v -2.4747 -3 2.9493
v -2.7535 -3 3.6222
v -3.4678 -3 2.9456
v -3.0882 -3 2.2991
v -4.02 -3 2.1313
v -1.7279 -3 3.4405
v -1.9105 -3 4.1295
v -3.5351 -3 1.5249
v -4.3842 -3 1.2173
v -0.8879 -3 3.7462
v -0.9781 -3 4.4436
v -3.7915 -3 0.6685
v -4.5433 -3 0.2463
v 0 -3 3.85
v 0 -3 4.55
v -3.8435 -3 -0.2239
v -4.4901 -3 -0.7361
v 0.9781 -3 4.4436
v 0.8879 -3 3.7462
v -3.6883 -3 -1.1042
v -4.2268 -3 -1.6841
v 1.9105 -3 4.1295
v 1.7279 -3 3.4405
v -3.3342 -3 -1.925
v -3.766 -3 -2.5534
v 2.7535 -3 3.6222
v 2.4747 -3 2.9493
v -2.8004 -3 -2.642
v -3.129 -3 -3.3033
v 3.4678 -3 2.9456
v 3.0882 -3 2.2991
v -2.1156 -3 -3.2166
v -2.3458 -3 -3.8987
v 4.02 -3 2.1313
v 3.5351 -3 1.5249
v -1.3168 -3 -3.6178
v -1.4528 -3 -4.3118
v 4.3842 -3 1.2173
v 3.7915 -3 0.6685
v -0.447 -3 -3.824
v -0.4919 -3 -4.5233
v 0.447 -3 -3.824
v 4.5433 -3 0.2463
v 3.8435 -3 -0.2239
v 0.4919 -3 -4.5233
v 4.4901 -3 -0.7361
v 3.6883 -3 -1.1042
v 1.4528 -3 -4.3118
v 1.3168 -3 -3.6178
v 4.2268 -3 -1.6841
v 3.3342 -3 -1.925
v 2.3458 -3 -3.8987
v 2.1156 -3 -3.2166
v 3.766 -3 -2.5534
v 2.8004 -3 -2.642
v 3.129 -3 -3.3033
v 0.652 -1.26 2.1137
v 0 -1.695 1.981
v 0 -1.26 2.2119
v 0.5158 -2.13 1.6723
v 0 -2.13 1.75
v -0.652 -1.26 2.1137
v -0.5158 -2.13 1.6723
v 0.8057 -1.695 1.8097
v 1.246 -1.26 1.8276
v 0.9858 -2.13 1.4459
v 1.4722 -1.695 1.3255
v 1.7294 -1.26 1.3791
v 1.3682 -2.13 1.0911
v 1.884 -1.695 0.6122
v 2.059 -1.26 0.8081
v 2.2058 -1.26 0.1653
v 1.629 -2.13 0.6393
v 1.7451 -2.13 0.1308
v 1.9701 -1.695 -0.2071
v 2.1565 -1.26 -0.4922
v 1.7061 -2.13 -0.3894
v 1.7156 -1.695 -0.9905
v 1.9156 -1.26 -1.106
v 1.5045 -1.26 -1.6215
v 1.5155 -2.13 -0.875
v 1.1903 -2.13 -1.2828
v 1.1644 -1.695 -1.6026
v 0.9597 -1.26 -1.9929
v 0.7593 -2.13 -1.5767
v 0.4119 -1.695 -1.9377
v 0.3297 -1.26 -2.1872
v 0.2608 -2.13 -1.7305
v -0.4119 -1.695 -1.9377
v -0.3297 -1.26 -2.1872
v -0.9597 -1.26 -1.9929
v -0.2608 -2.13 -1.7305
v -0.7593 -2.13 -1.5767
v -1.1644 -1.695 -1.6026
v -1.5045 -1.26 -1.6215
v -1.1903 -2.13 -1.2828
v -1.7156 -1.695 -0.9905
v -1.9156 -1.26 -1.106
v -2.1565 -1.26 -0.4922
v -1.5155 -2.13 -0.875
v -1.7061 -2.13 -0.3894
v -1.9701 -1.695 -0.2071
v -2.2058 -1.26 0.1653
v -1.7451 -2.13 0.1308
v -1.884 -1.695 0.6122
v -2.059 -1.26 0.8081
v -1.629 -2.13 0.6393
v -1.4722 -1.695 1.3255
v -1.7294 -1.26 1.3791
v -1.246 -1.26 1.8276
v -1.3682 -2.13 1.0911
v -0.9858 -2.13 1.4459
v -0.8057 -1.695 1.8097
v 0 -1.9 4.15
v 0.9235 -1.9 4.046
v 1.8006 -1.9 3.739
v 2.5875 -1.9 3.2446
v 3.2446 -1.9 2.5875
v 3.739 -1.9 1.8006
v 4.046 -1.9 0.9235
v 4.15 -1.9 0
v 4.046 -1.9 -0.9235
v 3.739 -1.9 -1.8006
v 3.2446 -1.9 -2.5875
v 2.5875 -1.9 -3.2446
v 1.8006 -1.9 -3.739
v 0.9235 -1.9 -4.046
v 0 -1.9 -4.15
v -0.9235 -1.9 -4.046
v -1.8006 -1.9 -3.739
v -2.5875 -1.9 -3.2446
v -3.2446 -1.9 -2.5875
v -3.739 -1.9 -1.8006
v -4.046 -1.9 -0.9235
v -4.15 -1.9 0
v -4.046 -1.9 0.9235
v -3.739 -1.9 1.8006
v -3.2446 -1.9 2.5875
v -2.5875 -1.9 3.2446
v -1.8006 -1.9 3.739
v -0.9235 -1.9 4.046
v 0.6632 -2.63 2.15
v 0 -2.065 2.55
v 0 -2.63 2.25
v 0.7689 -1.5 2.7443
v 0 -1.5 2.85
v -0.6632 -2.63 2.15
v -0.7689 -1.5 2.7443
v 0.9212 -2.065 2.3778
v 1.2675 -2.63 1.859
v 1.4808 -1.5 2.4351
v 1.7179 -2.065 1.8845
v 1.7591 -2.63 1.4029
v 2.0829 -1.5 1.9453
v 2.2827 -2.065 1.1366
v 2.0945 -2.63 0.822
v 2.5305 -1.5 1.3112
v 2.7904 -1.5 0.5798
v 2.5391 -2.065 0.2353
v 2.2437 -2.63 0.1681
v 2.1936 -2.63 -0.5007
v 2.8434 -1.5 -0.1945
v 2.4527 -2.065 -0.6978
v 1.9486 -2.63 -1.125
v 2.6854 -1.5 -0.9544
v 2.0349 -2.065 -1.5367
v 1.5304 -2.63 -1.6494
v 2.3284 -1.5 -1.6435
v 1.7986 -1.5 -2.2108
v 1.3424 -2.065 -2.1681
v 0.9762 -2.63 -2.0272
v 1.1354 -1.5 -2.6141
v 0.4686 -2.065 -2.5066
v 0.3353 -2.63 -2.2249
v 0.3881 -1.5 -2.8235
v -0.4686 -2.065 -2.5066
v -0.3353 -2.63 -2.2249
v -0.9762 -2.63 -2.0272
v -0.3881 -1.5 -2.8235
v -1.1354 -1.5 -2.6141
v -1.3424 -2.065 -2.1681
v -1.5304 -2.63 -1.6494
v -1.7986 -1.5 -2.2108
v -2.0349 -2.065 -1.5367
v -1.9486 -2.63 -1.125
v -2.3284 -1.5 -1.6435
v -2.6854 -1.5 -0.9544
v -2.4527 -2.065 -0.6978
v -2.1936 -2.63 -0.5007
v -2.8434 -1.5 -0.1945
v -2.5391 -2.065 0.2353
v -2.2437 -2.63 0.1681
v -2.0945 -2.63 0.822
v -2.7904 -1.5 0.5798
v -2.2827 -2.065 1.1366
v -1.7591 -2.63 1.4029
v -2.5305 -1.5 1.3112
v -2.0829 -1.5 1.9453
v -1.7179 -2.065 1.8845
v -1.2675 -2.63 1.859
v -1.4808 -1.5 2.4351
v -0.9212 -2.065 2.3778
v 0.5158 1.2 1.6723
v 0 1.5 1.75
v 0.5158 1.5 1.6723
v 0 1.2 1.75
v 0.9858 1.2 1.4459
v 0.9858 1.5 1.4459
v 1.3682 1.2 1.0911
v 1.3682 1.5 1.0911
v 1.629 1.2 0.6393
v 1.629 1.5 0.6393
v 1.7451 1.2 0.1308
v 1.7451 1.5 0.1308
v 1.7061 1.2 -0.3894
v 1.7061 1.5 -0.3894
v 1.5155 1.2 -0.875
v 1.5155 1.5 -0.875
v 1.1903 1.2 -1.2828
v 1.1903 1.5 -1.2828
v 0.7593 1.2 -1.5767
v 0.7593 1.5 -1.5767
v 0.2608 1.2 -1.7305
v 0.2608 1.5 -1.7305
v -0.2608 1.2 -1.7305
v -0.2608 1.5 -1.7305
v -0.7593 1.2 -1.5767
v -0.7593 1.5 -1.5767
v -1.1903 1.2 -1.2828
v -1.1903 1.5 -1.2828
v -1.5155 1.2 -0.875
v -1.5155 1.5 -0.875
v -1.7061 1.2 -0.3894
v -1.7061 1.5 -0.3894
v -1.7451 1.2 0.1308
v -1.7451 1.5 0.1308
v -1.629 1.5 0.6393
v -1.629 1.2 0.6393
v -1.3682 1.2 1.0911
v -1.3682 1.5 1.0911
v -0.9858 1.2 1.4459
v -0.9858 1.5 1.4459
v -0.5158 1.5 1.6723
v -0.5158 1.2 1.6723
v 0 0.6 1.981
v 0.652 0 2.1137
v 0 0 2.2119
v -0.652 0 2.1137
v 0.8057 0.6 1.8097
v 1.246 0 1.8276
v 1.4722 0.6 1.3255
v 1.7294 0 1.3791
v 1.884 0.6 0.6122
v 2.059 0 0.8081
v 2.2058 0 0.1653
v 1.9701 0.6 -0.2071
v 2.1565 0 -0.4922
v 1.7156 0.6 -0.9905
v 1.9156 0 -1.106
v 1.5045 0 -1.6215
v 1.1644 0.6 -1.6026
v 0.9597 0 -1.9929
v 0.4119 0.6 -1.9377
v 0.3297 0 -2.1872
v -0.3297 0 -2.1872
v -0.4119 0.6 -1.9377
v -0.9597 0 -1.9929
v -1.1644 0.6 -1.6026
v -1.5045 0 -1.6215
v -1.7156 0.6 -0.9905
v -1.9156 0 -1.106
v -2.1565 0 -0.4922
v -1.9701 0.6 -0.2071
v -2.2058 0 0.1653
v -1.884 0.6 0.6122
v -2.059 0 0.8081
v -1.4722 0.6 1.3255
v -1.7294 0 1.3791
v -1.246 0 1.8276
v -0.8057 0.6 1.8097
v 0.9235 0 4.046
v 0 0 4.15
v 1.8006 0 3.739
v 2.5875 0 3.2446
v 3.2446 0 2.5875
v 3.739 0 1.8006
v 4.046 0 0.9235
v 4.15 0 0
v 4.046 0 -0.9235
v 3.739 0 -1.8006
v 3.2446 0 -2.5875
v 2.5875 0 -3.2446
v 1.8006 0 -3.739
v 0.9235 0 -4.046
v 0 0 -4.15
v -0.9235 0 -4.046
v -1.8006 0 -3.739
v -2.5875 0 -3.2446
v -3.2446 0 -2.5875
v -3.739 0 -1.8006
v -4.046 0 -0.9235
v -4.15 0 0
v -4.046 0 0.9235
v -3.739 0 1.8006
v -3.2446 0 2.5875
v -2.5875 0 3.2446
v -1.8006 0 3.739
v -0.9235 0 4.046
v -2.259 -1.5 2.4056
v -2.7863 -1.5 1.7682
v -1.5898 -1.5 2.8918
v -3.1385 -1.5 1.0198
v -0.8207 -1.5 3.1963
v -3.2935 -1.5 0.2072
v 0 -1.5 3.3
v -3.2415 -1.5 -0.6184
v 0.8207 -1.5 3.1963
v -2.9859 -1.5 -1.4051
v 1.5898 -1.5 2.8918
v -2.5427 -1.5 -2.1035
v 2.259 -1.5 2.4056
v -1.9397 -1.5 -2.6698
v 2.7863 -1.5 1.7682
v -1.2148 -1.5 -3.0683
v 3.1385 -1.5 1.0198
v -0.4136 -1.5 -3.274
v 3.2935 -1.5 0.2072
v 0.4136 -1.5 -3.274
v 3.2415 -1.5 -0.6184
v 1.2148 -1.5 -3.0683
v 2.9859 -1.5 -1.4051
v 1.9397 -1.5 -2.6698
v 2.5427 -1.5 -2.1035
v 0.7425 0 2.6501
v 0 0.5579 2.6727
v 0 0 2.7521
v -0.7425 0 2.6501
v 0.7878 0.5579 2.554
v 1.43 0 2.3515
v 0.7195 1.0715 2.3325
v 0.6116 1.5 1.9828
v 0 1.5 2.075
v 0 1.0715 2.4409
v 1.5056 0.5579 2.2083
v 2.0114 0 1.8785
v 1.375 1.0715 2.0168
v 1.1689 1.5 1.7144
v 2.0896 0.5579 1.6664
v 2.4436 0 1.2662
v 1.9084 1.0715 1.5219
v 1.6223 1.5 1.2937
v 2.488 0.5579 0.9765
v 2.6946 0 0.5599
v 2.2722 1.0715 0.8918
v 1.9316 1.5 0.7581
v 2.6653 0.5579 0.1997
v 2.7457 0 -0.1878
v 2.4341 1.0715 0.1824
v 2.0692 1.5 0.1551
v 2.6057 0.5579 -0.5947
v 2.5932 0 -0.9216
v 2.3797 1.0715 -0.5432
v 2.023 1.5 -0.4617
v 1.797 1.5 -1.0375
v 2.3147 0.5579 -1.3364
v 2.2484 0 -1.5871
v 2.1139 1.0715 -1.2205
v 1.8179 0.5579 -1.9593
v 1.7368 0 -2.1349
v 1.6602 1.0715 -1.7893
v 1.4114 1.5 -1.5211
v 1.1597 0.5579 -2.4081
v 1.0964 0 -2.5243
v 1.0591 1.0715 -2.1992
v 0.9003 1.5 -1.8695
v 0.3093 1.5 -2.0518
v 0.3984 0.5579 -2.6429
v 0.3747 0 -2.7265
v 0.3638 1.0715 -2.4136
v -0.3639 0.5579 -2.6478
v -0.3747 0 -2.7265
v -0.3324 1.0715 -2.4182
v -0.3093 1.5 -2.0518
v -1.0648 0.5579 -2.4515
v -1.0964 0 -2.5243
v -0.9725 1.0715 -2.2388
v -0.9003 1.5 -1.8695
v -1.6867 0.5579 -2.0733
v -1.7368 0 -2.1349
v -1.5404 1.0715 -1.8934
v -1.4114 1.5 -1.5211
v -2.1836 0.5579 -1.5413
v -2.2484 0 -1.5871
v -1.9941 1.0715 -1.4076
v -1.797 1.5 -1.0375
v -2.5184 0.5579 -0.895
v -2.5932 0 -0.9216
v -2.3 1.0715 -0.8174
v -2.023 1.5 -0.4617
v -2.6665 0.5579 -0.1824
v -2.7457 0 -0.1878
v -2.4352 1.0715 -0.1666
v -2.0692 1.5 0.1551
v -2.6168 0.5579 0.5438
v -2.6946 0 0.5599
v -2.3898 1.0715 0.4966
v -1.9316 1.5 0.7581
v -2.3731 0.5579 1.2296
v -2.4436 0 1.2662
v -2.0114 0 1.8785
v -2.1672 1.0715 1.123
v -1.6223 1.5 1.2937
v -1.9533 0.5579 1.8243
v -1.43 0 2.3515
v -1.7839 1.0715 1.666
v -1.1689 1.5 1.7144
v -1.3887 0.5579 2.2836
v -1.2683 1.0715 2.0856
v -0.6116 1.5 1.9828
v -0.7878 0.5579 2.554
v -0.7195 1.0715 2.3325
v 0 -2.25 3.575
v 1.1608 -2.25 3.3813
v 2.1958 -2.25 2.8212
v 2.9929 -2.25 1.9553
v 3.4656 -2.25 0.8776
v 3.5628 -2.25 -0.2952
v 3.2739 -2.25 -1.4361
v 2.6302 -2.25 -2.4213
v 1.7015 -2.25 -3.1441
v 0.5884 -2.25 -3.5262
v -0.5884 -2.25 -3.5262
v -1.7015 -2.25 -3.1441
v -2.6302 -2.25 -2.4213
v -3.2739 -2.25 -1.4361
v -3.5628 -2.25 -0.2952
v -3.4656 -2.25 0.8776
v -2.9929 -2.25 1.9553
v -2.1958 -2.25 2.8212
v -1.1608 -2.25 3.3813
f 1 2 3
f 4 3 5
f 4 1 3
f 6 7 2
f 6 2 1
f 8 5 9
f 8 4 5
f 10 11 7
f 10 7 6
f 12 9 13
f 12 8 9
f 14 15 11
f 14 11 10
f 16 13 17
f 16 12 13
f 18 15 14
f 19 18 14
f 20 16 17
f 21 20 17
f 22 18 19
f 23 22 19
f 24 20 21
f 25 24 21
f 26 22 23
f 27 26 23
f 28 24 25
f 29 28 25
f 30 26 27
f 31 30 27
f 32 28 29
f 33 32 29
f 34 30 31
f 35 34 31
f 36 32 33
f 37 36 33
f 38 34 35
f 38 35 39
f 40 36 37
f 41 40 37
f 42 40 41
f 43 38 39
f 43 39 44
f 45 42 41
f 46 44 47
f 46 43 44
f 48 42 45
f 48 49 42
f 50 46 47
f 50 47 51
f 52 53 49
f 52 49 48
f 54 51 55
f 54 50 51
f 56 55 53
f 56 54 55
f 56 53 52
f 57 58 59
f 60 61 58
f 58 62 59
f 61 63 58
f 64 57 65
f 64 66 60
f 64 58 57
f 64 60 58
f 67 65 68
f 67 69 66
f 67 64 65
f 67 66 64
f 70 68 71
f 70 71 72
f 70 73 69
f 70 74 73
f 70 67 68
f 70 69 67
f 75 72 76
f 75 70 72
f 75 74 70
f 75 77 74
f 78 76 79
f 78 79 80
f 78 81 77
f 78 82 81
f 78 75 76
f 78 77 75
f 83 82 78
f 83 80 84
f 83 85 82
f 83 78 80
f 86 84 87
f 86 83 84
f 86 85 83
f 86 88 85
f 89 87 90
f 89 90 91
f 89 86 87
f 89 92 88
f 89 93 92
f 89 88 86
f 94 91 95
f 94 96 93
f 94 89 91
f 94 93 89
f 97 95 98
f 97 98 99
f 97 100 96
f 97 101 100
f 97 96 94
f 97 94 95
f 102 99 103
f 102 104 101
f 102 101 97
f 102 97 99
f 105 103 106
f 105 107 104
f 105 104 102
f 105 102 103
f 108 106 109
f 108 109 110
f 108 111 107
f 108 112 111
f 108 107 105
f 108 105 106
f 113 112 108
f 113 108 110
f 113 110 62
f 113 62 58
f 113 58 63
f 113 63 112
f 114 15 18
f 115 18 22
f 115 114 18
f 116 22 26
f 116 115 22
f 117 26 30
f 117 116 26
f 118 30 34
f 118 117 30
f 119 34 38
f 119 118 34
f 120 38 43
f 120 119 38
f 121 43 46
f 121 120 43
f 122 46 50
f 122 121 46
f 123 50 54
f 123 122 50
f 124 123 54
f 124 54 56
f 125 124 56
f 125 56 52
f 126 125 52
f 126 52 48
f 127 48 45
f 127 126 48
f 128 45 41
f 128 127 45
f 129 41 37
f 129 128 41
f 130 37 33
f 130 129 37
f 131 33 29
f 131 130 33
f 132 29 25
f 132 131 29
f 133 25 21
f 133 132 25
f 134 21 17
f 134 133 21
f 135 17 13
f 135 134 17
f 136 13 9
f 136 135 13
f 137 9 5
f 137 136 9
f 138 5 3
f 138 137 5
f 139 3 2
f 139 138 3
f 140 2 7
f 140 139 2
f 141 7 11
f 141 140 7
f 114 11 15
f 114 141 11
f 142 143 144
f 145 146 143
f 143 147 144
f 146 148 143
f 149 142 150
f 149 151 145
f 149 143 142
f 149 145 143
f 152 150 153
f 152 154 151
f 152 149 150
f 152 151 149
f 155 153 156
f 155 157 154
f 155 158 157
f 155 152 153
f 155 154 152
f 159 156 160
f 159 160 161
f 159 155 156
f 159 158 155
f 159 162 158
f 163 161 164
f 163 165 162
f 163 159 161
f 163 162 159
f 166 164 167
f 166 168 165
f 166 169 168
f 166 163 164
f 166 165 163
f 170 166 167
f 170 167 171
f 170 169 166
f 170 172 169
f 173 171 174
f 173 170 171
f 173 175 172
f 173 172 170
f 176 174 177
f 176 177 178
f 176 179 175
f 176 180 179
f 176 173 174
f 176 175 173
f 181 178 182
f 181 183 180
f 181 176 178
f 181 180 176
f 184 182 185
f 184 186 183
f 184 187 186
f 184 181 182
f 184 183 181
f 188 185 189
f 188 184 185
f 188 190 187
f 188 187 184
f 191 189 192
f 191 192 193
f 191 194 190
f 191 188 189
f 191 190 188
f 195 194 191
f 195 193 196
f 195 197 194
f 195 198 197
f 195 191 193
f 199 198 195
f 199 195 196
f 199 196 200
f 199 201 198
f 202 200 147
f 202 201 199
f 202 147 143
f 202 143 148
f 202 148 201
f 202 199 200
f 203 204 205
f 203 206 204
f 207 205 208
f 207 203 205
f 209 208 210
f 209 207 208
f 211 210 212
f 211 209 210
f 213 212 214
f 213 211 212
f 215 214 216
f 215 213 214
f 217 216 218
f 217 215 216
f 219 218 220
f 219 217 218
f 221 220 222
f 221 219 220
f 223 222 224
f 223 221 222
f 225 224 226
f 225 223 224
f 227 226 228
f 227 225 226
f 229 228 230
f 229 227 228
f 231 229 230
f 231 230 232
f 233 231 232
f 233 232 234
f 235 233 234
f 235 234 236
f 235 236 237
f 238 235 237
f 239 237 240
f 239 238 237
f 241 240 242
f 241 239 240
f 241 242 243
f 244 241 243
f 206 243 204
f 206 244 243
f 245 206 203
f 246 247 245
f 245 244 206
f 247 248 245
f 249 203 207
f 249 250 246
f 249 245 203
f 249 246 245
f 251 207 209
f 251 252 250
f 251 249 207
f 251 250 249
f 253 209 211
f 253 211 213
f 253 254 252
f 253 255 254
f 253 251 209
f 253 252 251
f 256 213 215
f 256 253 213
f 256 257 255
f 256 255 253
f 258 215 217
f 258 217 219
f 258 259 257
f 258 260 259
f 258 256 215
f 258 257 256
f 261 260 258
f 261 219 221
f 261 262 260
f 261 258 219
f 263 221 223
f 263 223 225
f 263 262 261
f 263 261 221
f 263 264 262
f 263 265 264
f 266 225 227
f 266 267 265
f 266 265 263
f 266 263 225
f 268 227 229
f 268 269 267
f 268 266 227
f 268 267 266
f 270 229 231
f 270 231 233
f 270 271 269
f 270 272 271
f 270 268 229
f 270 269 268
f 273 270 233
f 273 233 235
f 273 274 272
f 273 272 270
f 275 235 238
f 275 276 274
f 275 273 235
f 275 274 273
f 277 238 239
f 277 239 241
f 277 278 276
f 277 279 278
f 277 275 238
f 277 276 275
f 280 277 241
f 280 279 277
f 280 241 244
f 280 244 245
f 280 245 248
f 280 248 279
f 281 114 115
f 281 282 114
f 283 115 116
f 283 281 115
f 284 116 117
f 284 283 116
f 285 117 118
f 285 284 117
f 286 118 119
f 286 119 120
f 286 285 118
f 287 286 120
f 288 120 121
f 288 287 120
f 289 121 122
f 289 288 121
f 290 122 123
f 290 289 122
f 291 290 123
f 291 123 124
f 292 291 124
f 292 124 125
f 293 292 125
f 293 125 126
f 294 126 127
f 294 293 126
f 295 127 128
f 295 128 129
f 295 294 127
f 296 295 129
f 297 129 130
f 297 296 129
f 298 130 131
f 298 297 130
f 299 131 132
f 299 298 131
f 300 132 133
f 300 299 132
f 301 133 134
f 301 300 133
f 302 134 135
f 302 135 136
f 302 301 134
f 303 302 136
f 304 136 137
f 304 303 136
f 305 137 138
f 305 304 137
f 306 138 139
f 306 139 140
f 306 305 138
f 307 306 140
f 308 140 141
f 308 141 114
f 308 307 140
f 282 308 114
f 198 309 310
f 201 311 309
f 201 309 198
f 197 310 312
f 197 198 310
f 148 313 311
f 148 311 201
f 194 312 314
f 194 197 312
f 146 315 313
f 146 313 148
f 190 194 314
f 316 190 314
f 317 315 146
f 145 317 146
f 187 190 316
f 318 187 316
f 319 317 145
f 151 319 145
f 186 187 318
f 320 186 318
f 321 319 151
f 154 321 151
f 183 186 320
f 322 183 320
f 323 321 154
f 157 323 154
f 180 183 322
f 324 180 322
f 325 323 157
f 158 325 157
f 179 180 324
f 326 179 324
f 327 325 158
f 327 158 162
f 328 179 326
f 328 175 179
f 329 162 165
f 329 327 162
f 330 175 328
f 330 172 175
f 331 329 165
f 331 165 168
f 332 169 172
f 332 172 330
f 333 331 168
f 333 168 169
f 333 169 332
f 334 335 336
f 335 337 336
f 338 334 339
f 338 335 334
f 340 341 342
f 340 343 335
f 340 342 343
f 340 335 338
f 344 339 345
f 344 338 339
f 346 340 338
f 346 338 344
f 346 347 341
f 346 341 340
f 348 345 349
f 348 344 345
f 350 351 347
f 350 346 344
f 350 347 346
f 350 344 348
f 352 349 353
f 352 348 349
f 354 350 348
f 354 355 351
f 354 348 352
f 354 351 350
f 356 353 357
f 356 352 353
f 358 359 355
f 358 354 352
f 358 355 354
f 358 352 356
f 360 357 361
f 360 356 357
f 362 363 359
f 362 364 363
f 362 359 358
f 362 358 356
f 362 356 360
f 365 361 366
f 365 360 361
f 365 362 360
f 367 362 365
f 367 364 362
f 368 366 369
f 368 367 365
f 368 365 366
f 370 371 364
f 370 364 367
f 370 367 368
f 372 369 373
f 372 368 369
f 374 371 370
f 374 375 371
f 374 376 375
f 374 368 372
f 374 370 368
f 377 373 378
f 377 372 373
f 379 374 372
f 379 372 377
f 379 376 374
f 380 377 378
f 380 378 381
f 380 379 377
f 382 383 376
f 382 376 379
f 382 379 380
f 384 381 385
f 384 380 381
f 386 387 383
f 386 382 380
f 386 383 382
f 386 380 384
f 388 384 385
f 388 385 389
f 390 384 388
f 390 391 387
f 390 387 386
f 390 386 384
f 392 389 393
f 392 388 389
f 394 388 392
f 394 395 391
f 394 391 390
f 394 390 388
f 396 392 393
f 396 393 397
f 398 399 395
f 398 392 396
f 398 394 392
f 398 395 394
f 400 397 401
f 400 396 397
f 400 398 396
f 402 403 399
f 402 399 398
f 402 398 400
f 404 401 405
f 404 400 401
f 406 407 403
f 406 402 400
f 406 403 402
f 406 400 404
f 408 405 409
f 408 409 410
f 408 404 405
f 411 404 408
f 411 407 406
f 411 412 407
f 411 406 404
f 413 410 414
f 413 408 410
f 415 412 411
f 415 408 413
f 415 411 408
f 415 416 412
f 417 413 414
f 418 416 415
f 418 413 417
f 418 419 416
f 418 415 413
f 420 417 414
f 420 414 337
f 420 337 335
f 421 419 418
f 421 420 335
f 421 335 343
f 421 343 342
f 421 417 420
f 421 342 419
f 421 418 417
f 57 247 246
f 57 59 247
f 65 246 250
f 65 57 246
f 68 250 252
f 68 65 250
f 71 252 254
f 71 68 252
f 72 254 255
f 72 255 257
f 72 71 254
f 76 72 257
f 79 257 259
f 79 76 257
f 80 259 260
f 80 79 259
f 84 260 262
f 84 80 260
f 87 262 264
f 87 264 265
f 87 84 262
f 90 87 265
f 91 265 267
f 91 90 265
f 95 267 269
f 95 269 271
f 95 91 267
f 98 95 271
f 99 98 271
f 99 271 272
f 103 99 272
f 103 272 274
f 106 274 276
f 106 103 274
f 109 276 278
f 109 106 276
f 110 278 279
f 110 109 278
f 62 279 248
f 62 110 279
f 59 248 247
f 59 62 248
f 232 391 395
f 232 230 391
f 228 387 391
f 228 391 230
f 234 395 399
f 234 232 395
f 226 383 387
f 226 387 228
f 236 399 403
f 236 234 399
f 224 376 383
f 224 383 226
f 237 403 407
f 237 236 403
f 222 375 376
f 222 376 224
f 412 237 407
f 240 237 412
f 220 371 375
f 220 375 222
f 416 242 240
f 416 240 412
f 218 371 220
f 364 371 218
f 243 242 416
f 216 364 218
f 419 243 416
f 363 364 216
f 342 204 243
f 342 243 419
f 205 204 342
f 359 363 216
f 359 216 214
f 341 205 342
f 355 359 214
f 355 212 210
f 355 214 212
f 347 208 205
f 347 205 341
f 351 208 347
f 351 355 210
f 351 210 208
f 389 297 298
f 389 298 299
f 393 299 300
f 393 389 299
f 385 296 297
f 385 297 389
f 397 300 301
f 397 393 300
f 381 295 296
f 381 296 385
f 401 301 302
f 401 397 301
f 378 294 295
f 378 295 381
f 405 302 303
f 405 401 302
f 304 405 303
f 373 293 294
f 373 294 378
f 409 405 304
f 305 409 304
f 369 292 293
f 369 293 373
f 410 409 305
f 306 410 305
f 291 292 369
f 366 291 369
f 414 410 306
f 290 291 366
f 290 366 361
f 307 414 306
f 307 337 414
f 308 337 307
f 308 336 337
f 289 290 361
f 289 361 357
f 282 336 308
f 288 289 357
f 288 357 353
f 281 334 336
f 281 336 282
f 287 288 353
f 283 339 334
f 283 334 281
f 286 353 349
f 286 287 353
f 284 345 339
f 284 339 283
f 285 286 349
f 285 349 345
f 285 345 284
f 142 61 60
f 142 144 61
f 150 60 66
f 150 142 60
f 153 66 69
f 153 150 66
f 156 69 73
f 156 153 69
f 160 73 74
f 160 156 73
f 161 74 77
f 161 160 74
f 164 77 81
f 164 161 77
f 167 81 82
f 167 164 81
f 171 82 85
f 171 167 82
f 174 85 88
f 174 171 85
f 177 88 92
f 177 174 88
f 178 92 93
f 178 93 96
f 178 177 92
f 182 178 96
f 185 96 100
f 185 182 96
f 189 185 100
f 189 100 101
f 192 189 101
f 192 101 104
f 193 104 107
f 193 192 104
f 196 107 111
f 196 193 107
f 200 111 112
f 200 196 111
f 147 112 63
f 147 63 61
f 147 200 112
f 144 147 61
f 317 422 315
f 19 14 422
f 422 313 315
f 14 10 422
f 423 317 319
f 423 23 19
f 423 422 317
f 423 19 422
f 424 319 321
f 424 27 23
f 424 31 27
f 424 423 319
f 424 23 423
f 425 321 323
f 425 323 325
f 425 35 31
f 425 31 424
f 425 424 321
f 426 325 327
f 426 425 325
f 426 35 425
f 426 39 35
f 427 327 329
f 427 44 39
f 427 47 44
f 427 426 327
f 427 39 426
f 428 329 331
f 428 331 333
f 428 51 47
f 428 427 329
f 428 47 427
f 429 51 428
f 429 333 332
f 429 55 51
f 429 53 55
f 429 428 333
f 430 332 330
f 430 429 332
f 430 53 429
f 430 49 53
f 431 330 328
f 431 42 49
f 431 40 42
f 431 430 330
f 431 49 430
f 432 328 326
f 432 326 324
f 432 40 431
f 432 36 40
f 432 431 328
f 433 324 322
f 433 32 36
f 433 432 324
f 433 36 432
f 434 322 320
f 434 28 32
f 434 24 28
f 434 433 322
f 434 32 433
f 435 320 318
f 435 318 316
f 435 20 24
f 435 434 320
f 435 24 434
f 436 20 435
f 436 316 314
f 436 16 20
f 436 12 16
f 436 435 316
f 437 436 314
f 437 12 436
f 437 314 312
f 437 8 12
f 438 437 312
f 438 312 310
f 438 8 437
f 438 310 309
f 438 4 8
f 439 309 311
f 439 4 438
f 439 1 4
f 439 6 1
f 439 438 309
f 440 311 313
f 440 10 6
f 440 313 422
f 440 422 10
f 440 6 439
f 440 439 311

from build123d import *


with BuildPart() as part:
    # Sketch2 → Revolve1 (revolve)
    with BuildSketch(Plane(origin=(0, 0, 0), x_dir=(0, 0, -1), z_dir=(1, 0, 0))):
        with BuildLine():
            Line((-4.15, -1.9), (-4.15, 0))
            Line((-4.15, 0), (-2.752124344, 0))
            ThreePointArc((-2.752124344, 0), (-2.575, 0.822875656), (-2.075, 1.5))
            Line((-2.075, 1.5), (-1.75, 1.5))
            Line((-1.75, 1.5), (-1.75, 1.2))
            Line((-1.75, 1.2), (-2.211946903, 0))
            Line((-2.211946903, 0), (-2.211946903, -1.26))
            Line((-2.211946903, -1.26), (-1.75, -2.13))
            Line((-1.75, -2.13), (-2.25, -2.63))
            Line((-2.25, -2.63), (-2.85, -1.5))
            Line((-2.85, -1.5), (-3.3, -1.5))
            Line((-3.3, -1.5), (-3.85, -3))
            Line((-3.85, -3), (-4.55, -3))
            Line((-4.55, -3), (-4.15, -1.9))
        make_face()
    revolve(axis=Axis((0, 0, 0), (0, 1, 0)))


solid = part.part
